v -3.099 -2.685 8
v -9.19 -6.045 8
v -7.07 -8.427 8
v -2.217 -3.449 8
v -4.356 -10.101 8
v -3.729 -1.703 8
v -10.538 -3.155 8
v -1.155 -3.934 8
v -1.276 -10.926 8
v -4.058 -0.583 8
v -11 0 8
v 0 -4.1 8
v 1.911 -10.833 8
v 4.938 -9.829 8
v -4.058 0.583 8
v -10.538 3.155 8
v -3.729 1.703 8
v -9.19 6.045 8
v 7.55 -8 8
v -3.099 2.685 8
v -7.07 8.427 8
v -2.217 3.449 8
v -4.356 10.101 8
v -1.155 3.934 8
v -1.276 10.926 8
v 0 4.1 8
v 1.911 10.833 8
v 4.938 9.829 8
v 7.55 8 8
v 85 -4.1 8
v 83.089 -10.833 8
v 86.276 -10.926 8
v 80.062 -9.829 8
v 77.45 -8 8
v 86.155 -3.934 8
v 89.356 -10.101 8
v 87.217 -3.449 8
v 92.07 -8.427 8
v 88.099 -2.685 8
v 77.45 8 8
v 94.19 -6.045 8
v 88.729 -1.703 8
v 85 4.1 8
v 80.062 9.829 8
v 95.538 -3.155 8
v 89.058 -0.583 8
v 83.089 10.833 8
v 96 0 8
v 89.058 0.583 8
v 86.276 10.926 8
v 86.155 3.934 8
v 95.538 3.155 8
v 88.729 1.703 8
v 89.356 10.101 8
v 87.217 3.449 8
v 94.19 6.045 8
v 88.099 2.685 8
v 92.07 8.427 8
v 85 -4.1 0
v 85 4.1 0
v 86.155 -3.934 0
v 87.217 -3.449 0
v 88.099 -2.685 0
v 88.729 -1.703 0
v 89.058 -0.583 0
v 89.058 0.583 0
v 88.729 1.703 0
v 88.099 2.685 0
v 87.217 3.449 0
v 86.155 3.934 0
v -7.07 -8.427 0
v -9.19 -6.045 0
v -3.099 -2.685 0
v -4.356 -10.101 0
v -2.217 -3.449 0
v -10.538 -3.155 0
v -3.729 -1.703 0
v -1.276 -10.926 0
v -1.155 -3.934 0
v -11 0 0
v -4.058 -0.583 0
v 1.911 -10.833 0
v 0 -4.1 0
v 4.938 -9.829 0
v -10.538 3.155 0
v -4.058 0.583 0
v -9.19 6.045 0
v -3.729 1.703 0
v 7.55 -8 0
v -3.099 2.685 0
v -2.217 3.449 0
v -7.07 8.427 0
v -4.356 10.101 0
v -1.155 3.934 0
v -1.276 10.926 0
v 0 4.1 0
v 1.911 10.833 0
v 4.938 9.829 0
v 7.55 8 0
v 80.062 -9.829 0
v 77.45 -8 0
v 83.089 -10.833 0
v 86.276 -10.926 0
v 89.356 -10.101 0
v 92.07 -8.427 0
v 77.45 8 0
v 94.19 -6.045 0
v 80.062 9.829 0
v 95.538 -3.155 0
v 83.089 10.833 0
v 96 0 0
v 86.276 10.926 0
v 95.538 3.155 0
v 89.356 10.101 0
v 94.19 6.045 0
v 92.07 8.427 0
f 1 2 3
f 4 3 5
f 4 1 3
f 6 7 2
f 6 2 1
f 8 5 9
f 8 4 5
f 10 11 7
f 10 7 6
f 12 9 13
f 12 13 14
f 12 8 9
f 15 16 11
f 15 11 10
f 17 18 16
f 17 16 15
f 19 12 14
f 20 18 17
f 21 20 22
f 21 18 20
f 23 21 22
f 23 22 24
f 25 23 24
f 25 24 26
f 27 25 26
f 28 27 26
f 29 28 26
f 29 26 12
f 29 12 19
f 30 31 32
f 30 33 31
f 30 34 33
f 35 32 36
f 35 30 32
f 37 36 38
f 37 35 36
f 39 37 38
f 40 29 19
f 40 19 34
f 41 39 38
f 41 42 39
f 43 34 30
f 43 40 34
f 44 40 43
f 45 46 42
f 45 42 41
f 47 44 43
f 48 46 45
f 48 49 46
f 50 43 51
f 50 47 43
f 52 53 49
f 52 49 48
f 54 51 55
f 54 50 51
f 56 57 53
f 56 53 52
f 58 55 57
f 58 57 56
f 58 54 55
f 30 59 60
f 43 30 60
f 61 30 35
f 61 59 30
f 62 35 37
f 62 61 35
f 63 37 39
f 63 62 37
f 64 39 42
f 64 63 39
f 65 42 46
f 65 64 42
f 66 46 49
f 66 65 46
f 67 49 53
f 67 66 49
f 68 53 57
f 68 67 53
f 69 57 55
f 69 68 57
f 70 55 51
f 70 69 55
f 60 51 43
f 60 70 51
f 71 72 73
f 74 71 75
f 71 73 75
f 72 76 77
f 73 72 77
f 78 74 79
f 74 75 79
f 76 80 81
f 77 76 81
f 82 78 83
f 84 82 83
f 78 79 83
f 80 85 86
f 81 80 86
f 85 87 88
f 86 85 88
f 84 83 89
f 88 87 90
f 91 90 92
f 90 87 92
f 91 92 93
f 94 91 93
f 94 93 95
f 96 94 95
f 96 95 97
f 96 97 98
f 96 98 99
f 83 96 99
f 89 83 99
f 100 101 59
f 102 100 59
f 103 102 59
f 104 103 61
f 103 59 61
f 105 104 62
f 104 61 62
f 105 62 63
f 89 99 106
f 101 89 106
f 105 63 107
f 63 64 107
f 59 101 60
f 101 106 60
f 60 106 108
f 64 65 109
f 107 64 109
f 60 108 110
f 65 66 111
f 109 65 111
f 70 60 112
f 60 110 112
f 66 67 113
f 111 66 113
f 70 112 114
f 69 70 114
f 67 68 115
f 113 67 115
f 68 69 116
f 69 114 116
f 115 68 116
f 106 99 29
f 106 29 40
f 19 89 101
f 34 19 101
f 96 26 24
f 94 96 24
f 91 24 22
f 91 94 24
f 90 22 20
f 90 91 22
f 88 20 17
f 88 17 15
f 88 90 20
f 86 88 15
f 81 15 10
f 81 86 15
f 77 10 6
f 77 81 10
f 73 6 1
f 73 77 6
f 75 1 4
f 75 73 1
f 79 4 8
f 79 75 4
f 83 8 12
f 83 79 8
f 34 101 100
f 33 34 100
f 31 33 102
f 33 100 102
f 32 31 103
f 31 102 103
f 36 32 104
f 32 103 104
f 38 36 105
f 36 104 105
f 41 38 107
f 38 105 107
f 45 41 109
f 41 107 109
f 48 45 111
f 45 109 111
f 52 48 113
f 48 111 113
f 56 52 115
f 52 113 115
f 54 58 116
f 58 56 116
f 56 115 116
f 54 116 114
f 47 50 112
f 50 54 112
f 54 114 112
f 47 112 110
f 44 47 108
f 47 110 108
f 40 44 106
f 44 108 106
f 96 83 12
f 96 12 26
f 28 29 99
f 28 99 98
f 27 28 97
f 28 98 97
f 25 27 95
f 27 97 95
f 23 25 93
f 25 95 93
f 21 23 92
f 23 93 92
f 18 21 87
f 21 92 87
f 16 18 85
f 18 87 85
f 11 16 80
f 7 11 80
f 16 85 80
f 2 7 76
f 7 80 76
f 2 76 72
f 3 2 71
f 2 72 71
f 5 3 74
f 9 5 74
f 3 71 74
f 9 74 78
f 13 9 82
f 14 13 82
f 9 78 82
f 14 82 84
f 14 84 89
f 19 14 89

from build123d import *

# Parameters (mm, degrees)
SKETCH_1_W      = 85
SKETCH_1_H      = 16
EXTRUDE_1_DEPTH = 8
SKETCH_2_R      = 11
SKETCH_2_R_2    = 4.1
EXTRUDE_2_DEPTH = 8
SKETCH_3_R      = 11
SKETCH_3_R_2    = 4.1
EXTRUDE_3_DEPTH = 8


with BuildPart() as part:
    # 草图1 → 凸台-拉伸1 (new body)
    with BuildSketch(Plane.XY):
        with Locations((42.5, 0)):
            Rectangle(SKETCH_1_W, SKETCH_1_H)
    extrude(amount=EXTRUDE_1_DEPTH)

    # 草图2 → 凸台-拉伸2 (add)
    with BuildSketch(Plane.XY):
        Circle(SKETCH_2_R)
        Circle(SKETCH_2_R_2, mode=Mode.SUBTRACT)
    extrude(amount=EXTRUDE_2_DEPTH)

    # 草图3 → 凸台-拉伸3 (add)
    with BuildSketch(Plane.XY):
        with Locations((85, 0)):
            Circle(SKETCH_3_R)
        with Locations((85, 0)):
            Circle(SKETCH_3_R_2, mode=Mode.SUBTRACT)
    extrude(amount=EXTRUDE_3_DEPTH)


solid = part.part
